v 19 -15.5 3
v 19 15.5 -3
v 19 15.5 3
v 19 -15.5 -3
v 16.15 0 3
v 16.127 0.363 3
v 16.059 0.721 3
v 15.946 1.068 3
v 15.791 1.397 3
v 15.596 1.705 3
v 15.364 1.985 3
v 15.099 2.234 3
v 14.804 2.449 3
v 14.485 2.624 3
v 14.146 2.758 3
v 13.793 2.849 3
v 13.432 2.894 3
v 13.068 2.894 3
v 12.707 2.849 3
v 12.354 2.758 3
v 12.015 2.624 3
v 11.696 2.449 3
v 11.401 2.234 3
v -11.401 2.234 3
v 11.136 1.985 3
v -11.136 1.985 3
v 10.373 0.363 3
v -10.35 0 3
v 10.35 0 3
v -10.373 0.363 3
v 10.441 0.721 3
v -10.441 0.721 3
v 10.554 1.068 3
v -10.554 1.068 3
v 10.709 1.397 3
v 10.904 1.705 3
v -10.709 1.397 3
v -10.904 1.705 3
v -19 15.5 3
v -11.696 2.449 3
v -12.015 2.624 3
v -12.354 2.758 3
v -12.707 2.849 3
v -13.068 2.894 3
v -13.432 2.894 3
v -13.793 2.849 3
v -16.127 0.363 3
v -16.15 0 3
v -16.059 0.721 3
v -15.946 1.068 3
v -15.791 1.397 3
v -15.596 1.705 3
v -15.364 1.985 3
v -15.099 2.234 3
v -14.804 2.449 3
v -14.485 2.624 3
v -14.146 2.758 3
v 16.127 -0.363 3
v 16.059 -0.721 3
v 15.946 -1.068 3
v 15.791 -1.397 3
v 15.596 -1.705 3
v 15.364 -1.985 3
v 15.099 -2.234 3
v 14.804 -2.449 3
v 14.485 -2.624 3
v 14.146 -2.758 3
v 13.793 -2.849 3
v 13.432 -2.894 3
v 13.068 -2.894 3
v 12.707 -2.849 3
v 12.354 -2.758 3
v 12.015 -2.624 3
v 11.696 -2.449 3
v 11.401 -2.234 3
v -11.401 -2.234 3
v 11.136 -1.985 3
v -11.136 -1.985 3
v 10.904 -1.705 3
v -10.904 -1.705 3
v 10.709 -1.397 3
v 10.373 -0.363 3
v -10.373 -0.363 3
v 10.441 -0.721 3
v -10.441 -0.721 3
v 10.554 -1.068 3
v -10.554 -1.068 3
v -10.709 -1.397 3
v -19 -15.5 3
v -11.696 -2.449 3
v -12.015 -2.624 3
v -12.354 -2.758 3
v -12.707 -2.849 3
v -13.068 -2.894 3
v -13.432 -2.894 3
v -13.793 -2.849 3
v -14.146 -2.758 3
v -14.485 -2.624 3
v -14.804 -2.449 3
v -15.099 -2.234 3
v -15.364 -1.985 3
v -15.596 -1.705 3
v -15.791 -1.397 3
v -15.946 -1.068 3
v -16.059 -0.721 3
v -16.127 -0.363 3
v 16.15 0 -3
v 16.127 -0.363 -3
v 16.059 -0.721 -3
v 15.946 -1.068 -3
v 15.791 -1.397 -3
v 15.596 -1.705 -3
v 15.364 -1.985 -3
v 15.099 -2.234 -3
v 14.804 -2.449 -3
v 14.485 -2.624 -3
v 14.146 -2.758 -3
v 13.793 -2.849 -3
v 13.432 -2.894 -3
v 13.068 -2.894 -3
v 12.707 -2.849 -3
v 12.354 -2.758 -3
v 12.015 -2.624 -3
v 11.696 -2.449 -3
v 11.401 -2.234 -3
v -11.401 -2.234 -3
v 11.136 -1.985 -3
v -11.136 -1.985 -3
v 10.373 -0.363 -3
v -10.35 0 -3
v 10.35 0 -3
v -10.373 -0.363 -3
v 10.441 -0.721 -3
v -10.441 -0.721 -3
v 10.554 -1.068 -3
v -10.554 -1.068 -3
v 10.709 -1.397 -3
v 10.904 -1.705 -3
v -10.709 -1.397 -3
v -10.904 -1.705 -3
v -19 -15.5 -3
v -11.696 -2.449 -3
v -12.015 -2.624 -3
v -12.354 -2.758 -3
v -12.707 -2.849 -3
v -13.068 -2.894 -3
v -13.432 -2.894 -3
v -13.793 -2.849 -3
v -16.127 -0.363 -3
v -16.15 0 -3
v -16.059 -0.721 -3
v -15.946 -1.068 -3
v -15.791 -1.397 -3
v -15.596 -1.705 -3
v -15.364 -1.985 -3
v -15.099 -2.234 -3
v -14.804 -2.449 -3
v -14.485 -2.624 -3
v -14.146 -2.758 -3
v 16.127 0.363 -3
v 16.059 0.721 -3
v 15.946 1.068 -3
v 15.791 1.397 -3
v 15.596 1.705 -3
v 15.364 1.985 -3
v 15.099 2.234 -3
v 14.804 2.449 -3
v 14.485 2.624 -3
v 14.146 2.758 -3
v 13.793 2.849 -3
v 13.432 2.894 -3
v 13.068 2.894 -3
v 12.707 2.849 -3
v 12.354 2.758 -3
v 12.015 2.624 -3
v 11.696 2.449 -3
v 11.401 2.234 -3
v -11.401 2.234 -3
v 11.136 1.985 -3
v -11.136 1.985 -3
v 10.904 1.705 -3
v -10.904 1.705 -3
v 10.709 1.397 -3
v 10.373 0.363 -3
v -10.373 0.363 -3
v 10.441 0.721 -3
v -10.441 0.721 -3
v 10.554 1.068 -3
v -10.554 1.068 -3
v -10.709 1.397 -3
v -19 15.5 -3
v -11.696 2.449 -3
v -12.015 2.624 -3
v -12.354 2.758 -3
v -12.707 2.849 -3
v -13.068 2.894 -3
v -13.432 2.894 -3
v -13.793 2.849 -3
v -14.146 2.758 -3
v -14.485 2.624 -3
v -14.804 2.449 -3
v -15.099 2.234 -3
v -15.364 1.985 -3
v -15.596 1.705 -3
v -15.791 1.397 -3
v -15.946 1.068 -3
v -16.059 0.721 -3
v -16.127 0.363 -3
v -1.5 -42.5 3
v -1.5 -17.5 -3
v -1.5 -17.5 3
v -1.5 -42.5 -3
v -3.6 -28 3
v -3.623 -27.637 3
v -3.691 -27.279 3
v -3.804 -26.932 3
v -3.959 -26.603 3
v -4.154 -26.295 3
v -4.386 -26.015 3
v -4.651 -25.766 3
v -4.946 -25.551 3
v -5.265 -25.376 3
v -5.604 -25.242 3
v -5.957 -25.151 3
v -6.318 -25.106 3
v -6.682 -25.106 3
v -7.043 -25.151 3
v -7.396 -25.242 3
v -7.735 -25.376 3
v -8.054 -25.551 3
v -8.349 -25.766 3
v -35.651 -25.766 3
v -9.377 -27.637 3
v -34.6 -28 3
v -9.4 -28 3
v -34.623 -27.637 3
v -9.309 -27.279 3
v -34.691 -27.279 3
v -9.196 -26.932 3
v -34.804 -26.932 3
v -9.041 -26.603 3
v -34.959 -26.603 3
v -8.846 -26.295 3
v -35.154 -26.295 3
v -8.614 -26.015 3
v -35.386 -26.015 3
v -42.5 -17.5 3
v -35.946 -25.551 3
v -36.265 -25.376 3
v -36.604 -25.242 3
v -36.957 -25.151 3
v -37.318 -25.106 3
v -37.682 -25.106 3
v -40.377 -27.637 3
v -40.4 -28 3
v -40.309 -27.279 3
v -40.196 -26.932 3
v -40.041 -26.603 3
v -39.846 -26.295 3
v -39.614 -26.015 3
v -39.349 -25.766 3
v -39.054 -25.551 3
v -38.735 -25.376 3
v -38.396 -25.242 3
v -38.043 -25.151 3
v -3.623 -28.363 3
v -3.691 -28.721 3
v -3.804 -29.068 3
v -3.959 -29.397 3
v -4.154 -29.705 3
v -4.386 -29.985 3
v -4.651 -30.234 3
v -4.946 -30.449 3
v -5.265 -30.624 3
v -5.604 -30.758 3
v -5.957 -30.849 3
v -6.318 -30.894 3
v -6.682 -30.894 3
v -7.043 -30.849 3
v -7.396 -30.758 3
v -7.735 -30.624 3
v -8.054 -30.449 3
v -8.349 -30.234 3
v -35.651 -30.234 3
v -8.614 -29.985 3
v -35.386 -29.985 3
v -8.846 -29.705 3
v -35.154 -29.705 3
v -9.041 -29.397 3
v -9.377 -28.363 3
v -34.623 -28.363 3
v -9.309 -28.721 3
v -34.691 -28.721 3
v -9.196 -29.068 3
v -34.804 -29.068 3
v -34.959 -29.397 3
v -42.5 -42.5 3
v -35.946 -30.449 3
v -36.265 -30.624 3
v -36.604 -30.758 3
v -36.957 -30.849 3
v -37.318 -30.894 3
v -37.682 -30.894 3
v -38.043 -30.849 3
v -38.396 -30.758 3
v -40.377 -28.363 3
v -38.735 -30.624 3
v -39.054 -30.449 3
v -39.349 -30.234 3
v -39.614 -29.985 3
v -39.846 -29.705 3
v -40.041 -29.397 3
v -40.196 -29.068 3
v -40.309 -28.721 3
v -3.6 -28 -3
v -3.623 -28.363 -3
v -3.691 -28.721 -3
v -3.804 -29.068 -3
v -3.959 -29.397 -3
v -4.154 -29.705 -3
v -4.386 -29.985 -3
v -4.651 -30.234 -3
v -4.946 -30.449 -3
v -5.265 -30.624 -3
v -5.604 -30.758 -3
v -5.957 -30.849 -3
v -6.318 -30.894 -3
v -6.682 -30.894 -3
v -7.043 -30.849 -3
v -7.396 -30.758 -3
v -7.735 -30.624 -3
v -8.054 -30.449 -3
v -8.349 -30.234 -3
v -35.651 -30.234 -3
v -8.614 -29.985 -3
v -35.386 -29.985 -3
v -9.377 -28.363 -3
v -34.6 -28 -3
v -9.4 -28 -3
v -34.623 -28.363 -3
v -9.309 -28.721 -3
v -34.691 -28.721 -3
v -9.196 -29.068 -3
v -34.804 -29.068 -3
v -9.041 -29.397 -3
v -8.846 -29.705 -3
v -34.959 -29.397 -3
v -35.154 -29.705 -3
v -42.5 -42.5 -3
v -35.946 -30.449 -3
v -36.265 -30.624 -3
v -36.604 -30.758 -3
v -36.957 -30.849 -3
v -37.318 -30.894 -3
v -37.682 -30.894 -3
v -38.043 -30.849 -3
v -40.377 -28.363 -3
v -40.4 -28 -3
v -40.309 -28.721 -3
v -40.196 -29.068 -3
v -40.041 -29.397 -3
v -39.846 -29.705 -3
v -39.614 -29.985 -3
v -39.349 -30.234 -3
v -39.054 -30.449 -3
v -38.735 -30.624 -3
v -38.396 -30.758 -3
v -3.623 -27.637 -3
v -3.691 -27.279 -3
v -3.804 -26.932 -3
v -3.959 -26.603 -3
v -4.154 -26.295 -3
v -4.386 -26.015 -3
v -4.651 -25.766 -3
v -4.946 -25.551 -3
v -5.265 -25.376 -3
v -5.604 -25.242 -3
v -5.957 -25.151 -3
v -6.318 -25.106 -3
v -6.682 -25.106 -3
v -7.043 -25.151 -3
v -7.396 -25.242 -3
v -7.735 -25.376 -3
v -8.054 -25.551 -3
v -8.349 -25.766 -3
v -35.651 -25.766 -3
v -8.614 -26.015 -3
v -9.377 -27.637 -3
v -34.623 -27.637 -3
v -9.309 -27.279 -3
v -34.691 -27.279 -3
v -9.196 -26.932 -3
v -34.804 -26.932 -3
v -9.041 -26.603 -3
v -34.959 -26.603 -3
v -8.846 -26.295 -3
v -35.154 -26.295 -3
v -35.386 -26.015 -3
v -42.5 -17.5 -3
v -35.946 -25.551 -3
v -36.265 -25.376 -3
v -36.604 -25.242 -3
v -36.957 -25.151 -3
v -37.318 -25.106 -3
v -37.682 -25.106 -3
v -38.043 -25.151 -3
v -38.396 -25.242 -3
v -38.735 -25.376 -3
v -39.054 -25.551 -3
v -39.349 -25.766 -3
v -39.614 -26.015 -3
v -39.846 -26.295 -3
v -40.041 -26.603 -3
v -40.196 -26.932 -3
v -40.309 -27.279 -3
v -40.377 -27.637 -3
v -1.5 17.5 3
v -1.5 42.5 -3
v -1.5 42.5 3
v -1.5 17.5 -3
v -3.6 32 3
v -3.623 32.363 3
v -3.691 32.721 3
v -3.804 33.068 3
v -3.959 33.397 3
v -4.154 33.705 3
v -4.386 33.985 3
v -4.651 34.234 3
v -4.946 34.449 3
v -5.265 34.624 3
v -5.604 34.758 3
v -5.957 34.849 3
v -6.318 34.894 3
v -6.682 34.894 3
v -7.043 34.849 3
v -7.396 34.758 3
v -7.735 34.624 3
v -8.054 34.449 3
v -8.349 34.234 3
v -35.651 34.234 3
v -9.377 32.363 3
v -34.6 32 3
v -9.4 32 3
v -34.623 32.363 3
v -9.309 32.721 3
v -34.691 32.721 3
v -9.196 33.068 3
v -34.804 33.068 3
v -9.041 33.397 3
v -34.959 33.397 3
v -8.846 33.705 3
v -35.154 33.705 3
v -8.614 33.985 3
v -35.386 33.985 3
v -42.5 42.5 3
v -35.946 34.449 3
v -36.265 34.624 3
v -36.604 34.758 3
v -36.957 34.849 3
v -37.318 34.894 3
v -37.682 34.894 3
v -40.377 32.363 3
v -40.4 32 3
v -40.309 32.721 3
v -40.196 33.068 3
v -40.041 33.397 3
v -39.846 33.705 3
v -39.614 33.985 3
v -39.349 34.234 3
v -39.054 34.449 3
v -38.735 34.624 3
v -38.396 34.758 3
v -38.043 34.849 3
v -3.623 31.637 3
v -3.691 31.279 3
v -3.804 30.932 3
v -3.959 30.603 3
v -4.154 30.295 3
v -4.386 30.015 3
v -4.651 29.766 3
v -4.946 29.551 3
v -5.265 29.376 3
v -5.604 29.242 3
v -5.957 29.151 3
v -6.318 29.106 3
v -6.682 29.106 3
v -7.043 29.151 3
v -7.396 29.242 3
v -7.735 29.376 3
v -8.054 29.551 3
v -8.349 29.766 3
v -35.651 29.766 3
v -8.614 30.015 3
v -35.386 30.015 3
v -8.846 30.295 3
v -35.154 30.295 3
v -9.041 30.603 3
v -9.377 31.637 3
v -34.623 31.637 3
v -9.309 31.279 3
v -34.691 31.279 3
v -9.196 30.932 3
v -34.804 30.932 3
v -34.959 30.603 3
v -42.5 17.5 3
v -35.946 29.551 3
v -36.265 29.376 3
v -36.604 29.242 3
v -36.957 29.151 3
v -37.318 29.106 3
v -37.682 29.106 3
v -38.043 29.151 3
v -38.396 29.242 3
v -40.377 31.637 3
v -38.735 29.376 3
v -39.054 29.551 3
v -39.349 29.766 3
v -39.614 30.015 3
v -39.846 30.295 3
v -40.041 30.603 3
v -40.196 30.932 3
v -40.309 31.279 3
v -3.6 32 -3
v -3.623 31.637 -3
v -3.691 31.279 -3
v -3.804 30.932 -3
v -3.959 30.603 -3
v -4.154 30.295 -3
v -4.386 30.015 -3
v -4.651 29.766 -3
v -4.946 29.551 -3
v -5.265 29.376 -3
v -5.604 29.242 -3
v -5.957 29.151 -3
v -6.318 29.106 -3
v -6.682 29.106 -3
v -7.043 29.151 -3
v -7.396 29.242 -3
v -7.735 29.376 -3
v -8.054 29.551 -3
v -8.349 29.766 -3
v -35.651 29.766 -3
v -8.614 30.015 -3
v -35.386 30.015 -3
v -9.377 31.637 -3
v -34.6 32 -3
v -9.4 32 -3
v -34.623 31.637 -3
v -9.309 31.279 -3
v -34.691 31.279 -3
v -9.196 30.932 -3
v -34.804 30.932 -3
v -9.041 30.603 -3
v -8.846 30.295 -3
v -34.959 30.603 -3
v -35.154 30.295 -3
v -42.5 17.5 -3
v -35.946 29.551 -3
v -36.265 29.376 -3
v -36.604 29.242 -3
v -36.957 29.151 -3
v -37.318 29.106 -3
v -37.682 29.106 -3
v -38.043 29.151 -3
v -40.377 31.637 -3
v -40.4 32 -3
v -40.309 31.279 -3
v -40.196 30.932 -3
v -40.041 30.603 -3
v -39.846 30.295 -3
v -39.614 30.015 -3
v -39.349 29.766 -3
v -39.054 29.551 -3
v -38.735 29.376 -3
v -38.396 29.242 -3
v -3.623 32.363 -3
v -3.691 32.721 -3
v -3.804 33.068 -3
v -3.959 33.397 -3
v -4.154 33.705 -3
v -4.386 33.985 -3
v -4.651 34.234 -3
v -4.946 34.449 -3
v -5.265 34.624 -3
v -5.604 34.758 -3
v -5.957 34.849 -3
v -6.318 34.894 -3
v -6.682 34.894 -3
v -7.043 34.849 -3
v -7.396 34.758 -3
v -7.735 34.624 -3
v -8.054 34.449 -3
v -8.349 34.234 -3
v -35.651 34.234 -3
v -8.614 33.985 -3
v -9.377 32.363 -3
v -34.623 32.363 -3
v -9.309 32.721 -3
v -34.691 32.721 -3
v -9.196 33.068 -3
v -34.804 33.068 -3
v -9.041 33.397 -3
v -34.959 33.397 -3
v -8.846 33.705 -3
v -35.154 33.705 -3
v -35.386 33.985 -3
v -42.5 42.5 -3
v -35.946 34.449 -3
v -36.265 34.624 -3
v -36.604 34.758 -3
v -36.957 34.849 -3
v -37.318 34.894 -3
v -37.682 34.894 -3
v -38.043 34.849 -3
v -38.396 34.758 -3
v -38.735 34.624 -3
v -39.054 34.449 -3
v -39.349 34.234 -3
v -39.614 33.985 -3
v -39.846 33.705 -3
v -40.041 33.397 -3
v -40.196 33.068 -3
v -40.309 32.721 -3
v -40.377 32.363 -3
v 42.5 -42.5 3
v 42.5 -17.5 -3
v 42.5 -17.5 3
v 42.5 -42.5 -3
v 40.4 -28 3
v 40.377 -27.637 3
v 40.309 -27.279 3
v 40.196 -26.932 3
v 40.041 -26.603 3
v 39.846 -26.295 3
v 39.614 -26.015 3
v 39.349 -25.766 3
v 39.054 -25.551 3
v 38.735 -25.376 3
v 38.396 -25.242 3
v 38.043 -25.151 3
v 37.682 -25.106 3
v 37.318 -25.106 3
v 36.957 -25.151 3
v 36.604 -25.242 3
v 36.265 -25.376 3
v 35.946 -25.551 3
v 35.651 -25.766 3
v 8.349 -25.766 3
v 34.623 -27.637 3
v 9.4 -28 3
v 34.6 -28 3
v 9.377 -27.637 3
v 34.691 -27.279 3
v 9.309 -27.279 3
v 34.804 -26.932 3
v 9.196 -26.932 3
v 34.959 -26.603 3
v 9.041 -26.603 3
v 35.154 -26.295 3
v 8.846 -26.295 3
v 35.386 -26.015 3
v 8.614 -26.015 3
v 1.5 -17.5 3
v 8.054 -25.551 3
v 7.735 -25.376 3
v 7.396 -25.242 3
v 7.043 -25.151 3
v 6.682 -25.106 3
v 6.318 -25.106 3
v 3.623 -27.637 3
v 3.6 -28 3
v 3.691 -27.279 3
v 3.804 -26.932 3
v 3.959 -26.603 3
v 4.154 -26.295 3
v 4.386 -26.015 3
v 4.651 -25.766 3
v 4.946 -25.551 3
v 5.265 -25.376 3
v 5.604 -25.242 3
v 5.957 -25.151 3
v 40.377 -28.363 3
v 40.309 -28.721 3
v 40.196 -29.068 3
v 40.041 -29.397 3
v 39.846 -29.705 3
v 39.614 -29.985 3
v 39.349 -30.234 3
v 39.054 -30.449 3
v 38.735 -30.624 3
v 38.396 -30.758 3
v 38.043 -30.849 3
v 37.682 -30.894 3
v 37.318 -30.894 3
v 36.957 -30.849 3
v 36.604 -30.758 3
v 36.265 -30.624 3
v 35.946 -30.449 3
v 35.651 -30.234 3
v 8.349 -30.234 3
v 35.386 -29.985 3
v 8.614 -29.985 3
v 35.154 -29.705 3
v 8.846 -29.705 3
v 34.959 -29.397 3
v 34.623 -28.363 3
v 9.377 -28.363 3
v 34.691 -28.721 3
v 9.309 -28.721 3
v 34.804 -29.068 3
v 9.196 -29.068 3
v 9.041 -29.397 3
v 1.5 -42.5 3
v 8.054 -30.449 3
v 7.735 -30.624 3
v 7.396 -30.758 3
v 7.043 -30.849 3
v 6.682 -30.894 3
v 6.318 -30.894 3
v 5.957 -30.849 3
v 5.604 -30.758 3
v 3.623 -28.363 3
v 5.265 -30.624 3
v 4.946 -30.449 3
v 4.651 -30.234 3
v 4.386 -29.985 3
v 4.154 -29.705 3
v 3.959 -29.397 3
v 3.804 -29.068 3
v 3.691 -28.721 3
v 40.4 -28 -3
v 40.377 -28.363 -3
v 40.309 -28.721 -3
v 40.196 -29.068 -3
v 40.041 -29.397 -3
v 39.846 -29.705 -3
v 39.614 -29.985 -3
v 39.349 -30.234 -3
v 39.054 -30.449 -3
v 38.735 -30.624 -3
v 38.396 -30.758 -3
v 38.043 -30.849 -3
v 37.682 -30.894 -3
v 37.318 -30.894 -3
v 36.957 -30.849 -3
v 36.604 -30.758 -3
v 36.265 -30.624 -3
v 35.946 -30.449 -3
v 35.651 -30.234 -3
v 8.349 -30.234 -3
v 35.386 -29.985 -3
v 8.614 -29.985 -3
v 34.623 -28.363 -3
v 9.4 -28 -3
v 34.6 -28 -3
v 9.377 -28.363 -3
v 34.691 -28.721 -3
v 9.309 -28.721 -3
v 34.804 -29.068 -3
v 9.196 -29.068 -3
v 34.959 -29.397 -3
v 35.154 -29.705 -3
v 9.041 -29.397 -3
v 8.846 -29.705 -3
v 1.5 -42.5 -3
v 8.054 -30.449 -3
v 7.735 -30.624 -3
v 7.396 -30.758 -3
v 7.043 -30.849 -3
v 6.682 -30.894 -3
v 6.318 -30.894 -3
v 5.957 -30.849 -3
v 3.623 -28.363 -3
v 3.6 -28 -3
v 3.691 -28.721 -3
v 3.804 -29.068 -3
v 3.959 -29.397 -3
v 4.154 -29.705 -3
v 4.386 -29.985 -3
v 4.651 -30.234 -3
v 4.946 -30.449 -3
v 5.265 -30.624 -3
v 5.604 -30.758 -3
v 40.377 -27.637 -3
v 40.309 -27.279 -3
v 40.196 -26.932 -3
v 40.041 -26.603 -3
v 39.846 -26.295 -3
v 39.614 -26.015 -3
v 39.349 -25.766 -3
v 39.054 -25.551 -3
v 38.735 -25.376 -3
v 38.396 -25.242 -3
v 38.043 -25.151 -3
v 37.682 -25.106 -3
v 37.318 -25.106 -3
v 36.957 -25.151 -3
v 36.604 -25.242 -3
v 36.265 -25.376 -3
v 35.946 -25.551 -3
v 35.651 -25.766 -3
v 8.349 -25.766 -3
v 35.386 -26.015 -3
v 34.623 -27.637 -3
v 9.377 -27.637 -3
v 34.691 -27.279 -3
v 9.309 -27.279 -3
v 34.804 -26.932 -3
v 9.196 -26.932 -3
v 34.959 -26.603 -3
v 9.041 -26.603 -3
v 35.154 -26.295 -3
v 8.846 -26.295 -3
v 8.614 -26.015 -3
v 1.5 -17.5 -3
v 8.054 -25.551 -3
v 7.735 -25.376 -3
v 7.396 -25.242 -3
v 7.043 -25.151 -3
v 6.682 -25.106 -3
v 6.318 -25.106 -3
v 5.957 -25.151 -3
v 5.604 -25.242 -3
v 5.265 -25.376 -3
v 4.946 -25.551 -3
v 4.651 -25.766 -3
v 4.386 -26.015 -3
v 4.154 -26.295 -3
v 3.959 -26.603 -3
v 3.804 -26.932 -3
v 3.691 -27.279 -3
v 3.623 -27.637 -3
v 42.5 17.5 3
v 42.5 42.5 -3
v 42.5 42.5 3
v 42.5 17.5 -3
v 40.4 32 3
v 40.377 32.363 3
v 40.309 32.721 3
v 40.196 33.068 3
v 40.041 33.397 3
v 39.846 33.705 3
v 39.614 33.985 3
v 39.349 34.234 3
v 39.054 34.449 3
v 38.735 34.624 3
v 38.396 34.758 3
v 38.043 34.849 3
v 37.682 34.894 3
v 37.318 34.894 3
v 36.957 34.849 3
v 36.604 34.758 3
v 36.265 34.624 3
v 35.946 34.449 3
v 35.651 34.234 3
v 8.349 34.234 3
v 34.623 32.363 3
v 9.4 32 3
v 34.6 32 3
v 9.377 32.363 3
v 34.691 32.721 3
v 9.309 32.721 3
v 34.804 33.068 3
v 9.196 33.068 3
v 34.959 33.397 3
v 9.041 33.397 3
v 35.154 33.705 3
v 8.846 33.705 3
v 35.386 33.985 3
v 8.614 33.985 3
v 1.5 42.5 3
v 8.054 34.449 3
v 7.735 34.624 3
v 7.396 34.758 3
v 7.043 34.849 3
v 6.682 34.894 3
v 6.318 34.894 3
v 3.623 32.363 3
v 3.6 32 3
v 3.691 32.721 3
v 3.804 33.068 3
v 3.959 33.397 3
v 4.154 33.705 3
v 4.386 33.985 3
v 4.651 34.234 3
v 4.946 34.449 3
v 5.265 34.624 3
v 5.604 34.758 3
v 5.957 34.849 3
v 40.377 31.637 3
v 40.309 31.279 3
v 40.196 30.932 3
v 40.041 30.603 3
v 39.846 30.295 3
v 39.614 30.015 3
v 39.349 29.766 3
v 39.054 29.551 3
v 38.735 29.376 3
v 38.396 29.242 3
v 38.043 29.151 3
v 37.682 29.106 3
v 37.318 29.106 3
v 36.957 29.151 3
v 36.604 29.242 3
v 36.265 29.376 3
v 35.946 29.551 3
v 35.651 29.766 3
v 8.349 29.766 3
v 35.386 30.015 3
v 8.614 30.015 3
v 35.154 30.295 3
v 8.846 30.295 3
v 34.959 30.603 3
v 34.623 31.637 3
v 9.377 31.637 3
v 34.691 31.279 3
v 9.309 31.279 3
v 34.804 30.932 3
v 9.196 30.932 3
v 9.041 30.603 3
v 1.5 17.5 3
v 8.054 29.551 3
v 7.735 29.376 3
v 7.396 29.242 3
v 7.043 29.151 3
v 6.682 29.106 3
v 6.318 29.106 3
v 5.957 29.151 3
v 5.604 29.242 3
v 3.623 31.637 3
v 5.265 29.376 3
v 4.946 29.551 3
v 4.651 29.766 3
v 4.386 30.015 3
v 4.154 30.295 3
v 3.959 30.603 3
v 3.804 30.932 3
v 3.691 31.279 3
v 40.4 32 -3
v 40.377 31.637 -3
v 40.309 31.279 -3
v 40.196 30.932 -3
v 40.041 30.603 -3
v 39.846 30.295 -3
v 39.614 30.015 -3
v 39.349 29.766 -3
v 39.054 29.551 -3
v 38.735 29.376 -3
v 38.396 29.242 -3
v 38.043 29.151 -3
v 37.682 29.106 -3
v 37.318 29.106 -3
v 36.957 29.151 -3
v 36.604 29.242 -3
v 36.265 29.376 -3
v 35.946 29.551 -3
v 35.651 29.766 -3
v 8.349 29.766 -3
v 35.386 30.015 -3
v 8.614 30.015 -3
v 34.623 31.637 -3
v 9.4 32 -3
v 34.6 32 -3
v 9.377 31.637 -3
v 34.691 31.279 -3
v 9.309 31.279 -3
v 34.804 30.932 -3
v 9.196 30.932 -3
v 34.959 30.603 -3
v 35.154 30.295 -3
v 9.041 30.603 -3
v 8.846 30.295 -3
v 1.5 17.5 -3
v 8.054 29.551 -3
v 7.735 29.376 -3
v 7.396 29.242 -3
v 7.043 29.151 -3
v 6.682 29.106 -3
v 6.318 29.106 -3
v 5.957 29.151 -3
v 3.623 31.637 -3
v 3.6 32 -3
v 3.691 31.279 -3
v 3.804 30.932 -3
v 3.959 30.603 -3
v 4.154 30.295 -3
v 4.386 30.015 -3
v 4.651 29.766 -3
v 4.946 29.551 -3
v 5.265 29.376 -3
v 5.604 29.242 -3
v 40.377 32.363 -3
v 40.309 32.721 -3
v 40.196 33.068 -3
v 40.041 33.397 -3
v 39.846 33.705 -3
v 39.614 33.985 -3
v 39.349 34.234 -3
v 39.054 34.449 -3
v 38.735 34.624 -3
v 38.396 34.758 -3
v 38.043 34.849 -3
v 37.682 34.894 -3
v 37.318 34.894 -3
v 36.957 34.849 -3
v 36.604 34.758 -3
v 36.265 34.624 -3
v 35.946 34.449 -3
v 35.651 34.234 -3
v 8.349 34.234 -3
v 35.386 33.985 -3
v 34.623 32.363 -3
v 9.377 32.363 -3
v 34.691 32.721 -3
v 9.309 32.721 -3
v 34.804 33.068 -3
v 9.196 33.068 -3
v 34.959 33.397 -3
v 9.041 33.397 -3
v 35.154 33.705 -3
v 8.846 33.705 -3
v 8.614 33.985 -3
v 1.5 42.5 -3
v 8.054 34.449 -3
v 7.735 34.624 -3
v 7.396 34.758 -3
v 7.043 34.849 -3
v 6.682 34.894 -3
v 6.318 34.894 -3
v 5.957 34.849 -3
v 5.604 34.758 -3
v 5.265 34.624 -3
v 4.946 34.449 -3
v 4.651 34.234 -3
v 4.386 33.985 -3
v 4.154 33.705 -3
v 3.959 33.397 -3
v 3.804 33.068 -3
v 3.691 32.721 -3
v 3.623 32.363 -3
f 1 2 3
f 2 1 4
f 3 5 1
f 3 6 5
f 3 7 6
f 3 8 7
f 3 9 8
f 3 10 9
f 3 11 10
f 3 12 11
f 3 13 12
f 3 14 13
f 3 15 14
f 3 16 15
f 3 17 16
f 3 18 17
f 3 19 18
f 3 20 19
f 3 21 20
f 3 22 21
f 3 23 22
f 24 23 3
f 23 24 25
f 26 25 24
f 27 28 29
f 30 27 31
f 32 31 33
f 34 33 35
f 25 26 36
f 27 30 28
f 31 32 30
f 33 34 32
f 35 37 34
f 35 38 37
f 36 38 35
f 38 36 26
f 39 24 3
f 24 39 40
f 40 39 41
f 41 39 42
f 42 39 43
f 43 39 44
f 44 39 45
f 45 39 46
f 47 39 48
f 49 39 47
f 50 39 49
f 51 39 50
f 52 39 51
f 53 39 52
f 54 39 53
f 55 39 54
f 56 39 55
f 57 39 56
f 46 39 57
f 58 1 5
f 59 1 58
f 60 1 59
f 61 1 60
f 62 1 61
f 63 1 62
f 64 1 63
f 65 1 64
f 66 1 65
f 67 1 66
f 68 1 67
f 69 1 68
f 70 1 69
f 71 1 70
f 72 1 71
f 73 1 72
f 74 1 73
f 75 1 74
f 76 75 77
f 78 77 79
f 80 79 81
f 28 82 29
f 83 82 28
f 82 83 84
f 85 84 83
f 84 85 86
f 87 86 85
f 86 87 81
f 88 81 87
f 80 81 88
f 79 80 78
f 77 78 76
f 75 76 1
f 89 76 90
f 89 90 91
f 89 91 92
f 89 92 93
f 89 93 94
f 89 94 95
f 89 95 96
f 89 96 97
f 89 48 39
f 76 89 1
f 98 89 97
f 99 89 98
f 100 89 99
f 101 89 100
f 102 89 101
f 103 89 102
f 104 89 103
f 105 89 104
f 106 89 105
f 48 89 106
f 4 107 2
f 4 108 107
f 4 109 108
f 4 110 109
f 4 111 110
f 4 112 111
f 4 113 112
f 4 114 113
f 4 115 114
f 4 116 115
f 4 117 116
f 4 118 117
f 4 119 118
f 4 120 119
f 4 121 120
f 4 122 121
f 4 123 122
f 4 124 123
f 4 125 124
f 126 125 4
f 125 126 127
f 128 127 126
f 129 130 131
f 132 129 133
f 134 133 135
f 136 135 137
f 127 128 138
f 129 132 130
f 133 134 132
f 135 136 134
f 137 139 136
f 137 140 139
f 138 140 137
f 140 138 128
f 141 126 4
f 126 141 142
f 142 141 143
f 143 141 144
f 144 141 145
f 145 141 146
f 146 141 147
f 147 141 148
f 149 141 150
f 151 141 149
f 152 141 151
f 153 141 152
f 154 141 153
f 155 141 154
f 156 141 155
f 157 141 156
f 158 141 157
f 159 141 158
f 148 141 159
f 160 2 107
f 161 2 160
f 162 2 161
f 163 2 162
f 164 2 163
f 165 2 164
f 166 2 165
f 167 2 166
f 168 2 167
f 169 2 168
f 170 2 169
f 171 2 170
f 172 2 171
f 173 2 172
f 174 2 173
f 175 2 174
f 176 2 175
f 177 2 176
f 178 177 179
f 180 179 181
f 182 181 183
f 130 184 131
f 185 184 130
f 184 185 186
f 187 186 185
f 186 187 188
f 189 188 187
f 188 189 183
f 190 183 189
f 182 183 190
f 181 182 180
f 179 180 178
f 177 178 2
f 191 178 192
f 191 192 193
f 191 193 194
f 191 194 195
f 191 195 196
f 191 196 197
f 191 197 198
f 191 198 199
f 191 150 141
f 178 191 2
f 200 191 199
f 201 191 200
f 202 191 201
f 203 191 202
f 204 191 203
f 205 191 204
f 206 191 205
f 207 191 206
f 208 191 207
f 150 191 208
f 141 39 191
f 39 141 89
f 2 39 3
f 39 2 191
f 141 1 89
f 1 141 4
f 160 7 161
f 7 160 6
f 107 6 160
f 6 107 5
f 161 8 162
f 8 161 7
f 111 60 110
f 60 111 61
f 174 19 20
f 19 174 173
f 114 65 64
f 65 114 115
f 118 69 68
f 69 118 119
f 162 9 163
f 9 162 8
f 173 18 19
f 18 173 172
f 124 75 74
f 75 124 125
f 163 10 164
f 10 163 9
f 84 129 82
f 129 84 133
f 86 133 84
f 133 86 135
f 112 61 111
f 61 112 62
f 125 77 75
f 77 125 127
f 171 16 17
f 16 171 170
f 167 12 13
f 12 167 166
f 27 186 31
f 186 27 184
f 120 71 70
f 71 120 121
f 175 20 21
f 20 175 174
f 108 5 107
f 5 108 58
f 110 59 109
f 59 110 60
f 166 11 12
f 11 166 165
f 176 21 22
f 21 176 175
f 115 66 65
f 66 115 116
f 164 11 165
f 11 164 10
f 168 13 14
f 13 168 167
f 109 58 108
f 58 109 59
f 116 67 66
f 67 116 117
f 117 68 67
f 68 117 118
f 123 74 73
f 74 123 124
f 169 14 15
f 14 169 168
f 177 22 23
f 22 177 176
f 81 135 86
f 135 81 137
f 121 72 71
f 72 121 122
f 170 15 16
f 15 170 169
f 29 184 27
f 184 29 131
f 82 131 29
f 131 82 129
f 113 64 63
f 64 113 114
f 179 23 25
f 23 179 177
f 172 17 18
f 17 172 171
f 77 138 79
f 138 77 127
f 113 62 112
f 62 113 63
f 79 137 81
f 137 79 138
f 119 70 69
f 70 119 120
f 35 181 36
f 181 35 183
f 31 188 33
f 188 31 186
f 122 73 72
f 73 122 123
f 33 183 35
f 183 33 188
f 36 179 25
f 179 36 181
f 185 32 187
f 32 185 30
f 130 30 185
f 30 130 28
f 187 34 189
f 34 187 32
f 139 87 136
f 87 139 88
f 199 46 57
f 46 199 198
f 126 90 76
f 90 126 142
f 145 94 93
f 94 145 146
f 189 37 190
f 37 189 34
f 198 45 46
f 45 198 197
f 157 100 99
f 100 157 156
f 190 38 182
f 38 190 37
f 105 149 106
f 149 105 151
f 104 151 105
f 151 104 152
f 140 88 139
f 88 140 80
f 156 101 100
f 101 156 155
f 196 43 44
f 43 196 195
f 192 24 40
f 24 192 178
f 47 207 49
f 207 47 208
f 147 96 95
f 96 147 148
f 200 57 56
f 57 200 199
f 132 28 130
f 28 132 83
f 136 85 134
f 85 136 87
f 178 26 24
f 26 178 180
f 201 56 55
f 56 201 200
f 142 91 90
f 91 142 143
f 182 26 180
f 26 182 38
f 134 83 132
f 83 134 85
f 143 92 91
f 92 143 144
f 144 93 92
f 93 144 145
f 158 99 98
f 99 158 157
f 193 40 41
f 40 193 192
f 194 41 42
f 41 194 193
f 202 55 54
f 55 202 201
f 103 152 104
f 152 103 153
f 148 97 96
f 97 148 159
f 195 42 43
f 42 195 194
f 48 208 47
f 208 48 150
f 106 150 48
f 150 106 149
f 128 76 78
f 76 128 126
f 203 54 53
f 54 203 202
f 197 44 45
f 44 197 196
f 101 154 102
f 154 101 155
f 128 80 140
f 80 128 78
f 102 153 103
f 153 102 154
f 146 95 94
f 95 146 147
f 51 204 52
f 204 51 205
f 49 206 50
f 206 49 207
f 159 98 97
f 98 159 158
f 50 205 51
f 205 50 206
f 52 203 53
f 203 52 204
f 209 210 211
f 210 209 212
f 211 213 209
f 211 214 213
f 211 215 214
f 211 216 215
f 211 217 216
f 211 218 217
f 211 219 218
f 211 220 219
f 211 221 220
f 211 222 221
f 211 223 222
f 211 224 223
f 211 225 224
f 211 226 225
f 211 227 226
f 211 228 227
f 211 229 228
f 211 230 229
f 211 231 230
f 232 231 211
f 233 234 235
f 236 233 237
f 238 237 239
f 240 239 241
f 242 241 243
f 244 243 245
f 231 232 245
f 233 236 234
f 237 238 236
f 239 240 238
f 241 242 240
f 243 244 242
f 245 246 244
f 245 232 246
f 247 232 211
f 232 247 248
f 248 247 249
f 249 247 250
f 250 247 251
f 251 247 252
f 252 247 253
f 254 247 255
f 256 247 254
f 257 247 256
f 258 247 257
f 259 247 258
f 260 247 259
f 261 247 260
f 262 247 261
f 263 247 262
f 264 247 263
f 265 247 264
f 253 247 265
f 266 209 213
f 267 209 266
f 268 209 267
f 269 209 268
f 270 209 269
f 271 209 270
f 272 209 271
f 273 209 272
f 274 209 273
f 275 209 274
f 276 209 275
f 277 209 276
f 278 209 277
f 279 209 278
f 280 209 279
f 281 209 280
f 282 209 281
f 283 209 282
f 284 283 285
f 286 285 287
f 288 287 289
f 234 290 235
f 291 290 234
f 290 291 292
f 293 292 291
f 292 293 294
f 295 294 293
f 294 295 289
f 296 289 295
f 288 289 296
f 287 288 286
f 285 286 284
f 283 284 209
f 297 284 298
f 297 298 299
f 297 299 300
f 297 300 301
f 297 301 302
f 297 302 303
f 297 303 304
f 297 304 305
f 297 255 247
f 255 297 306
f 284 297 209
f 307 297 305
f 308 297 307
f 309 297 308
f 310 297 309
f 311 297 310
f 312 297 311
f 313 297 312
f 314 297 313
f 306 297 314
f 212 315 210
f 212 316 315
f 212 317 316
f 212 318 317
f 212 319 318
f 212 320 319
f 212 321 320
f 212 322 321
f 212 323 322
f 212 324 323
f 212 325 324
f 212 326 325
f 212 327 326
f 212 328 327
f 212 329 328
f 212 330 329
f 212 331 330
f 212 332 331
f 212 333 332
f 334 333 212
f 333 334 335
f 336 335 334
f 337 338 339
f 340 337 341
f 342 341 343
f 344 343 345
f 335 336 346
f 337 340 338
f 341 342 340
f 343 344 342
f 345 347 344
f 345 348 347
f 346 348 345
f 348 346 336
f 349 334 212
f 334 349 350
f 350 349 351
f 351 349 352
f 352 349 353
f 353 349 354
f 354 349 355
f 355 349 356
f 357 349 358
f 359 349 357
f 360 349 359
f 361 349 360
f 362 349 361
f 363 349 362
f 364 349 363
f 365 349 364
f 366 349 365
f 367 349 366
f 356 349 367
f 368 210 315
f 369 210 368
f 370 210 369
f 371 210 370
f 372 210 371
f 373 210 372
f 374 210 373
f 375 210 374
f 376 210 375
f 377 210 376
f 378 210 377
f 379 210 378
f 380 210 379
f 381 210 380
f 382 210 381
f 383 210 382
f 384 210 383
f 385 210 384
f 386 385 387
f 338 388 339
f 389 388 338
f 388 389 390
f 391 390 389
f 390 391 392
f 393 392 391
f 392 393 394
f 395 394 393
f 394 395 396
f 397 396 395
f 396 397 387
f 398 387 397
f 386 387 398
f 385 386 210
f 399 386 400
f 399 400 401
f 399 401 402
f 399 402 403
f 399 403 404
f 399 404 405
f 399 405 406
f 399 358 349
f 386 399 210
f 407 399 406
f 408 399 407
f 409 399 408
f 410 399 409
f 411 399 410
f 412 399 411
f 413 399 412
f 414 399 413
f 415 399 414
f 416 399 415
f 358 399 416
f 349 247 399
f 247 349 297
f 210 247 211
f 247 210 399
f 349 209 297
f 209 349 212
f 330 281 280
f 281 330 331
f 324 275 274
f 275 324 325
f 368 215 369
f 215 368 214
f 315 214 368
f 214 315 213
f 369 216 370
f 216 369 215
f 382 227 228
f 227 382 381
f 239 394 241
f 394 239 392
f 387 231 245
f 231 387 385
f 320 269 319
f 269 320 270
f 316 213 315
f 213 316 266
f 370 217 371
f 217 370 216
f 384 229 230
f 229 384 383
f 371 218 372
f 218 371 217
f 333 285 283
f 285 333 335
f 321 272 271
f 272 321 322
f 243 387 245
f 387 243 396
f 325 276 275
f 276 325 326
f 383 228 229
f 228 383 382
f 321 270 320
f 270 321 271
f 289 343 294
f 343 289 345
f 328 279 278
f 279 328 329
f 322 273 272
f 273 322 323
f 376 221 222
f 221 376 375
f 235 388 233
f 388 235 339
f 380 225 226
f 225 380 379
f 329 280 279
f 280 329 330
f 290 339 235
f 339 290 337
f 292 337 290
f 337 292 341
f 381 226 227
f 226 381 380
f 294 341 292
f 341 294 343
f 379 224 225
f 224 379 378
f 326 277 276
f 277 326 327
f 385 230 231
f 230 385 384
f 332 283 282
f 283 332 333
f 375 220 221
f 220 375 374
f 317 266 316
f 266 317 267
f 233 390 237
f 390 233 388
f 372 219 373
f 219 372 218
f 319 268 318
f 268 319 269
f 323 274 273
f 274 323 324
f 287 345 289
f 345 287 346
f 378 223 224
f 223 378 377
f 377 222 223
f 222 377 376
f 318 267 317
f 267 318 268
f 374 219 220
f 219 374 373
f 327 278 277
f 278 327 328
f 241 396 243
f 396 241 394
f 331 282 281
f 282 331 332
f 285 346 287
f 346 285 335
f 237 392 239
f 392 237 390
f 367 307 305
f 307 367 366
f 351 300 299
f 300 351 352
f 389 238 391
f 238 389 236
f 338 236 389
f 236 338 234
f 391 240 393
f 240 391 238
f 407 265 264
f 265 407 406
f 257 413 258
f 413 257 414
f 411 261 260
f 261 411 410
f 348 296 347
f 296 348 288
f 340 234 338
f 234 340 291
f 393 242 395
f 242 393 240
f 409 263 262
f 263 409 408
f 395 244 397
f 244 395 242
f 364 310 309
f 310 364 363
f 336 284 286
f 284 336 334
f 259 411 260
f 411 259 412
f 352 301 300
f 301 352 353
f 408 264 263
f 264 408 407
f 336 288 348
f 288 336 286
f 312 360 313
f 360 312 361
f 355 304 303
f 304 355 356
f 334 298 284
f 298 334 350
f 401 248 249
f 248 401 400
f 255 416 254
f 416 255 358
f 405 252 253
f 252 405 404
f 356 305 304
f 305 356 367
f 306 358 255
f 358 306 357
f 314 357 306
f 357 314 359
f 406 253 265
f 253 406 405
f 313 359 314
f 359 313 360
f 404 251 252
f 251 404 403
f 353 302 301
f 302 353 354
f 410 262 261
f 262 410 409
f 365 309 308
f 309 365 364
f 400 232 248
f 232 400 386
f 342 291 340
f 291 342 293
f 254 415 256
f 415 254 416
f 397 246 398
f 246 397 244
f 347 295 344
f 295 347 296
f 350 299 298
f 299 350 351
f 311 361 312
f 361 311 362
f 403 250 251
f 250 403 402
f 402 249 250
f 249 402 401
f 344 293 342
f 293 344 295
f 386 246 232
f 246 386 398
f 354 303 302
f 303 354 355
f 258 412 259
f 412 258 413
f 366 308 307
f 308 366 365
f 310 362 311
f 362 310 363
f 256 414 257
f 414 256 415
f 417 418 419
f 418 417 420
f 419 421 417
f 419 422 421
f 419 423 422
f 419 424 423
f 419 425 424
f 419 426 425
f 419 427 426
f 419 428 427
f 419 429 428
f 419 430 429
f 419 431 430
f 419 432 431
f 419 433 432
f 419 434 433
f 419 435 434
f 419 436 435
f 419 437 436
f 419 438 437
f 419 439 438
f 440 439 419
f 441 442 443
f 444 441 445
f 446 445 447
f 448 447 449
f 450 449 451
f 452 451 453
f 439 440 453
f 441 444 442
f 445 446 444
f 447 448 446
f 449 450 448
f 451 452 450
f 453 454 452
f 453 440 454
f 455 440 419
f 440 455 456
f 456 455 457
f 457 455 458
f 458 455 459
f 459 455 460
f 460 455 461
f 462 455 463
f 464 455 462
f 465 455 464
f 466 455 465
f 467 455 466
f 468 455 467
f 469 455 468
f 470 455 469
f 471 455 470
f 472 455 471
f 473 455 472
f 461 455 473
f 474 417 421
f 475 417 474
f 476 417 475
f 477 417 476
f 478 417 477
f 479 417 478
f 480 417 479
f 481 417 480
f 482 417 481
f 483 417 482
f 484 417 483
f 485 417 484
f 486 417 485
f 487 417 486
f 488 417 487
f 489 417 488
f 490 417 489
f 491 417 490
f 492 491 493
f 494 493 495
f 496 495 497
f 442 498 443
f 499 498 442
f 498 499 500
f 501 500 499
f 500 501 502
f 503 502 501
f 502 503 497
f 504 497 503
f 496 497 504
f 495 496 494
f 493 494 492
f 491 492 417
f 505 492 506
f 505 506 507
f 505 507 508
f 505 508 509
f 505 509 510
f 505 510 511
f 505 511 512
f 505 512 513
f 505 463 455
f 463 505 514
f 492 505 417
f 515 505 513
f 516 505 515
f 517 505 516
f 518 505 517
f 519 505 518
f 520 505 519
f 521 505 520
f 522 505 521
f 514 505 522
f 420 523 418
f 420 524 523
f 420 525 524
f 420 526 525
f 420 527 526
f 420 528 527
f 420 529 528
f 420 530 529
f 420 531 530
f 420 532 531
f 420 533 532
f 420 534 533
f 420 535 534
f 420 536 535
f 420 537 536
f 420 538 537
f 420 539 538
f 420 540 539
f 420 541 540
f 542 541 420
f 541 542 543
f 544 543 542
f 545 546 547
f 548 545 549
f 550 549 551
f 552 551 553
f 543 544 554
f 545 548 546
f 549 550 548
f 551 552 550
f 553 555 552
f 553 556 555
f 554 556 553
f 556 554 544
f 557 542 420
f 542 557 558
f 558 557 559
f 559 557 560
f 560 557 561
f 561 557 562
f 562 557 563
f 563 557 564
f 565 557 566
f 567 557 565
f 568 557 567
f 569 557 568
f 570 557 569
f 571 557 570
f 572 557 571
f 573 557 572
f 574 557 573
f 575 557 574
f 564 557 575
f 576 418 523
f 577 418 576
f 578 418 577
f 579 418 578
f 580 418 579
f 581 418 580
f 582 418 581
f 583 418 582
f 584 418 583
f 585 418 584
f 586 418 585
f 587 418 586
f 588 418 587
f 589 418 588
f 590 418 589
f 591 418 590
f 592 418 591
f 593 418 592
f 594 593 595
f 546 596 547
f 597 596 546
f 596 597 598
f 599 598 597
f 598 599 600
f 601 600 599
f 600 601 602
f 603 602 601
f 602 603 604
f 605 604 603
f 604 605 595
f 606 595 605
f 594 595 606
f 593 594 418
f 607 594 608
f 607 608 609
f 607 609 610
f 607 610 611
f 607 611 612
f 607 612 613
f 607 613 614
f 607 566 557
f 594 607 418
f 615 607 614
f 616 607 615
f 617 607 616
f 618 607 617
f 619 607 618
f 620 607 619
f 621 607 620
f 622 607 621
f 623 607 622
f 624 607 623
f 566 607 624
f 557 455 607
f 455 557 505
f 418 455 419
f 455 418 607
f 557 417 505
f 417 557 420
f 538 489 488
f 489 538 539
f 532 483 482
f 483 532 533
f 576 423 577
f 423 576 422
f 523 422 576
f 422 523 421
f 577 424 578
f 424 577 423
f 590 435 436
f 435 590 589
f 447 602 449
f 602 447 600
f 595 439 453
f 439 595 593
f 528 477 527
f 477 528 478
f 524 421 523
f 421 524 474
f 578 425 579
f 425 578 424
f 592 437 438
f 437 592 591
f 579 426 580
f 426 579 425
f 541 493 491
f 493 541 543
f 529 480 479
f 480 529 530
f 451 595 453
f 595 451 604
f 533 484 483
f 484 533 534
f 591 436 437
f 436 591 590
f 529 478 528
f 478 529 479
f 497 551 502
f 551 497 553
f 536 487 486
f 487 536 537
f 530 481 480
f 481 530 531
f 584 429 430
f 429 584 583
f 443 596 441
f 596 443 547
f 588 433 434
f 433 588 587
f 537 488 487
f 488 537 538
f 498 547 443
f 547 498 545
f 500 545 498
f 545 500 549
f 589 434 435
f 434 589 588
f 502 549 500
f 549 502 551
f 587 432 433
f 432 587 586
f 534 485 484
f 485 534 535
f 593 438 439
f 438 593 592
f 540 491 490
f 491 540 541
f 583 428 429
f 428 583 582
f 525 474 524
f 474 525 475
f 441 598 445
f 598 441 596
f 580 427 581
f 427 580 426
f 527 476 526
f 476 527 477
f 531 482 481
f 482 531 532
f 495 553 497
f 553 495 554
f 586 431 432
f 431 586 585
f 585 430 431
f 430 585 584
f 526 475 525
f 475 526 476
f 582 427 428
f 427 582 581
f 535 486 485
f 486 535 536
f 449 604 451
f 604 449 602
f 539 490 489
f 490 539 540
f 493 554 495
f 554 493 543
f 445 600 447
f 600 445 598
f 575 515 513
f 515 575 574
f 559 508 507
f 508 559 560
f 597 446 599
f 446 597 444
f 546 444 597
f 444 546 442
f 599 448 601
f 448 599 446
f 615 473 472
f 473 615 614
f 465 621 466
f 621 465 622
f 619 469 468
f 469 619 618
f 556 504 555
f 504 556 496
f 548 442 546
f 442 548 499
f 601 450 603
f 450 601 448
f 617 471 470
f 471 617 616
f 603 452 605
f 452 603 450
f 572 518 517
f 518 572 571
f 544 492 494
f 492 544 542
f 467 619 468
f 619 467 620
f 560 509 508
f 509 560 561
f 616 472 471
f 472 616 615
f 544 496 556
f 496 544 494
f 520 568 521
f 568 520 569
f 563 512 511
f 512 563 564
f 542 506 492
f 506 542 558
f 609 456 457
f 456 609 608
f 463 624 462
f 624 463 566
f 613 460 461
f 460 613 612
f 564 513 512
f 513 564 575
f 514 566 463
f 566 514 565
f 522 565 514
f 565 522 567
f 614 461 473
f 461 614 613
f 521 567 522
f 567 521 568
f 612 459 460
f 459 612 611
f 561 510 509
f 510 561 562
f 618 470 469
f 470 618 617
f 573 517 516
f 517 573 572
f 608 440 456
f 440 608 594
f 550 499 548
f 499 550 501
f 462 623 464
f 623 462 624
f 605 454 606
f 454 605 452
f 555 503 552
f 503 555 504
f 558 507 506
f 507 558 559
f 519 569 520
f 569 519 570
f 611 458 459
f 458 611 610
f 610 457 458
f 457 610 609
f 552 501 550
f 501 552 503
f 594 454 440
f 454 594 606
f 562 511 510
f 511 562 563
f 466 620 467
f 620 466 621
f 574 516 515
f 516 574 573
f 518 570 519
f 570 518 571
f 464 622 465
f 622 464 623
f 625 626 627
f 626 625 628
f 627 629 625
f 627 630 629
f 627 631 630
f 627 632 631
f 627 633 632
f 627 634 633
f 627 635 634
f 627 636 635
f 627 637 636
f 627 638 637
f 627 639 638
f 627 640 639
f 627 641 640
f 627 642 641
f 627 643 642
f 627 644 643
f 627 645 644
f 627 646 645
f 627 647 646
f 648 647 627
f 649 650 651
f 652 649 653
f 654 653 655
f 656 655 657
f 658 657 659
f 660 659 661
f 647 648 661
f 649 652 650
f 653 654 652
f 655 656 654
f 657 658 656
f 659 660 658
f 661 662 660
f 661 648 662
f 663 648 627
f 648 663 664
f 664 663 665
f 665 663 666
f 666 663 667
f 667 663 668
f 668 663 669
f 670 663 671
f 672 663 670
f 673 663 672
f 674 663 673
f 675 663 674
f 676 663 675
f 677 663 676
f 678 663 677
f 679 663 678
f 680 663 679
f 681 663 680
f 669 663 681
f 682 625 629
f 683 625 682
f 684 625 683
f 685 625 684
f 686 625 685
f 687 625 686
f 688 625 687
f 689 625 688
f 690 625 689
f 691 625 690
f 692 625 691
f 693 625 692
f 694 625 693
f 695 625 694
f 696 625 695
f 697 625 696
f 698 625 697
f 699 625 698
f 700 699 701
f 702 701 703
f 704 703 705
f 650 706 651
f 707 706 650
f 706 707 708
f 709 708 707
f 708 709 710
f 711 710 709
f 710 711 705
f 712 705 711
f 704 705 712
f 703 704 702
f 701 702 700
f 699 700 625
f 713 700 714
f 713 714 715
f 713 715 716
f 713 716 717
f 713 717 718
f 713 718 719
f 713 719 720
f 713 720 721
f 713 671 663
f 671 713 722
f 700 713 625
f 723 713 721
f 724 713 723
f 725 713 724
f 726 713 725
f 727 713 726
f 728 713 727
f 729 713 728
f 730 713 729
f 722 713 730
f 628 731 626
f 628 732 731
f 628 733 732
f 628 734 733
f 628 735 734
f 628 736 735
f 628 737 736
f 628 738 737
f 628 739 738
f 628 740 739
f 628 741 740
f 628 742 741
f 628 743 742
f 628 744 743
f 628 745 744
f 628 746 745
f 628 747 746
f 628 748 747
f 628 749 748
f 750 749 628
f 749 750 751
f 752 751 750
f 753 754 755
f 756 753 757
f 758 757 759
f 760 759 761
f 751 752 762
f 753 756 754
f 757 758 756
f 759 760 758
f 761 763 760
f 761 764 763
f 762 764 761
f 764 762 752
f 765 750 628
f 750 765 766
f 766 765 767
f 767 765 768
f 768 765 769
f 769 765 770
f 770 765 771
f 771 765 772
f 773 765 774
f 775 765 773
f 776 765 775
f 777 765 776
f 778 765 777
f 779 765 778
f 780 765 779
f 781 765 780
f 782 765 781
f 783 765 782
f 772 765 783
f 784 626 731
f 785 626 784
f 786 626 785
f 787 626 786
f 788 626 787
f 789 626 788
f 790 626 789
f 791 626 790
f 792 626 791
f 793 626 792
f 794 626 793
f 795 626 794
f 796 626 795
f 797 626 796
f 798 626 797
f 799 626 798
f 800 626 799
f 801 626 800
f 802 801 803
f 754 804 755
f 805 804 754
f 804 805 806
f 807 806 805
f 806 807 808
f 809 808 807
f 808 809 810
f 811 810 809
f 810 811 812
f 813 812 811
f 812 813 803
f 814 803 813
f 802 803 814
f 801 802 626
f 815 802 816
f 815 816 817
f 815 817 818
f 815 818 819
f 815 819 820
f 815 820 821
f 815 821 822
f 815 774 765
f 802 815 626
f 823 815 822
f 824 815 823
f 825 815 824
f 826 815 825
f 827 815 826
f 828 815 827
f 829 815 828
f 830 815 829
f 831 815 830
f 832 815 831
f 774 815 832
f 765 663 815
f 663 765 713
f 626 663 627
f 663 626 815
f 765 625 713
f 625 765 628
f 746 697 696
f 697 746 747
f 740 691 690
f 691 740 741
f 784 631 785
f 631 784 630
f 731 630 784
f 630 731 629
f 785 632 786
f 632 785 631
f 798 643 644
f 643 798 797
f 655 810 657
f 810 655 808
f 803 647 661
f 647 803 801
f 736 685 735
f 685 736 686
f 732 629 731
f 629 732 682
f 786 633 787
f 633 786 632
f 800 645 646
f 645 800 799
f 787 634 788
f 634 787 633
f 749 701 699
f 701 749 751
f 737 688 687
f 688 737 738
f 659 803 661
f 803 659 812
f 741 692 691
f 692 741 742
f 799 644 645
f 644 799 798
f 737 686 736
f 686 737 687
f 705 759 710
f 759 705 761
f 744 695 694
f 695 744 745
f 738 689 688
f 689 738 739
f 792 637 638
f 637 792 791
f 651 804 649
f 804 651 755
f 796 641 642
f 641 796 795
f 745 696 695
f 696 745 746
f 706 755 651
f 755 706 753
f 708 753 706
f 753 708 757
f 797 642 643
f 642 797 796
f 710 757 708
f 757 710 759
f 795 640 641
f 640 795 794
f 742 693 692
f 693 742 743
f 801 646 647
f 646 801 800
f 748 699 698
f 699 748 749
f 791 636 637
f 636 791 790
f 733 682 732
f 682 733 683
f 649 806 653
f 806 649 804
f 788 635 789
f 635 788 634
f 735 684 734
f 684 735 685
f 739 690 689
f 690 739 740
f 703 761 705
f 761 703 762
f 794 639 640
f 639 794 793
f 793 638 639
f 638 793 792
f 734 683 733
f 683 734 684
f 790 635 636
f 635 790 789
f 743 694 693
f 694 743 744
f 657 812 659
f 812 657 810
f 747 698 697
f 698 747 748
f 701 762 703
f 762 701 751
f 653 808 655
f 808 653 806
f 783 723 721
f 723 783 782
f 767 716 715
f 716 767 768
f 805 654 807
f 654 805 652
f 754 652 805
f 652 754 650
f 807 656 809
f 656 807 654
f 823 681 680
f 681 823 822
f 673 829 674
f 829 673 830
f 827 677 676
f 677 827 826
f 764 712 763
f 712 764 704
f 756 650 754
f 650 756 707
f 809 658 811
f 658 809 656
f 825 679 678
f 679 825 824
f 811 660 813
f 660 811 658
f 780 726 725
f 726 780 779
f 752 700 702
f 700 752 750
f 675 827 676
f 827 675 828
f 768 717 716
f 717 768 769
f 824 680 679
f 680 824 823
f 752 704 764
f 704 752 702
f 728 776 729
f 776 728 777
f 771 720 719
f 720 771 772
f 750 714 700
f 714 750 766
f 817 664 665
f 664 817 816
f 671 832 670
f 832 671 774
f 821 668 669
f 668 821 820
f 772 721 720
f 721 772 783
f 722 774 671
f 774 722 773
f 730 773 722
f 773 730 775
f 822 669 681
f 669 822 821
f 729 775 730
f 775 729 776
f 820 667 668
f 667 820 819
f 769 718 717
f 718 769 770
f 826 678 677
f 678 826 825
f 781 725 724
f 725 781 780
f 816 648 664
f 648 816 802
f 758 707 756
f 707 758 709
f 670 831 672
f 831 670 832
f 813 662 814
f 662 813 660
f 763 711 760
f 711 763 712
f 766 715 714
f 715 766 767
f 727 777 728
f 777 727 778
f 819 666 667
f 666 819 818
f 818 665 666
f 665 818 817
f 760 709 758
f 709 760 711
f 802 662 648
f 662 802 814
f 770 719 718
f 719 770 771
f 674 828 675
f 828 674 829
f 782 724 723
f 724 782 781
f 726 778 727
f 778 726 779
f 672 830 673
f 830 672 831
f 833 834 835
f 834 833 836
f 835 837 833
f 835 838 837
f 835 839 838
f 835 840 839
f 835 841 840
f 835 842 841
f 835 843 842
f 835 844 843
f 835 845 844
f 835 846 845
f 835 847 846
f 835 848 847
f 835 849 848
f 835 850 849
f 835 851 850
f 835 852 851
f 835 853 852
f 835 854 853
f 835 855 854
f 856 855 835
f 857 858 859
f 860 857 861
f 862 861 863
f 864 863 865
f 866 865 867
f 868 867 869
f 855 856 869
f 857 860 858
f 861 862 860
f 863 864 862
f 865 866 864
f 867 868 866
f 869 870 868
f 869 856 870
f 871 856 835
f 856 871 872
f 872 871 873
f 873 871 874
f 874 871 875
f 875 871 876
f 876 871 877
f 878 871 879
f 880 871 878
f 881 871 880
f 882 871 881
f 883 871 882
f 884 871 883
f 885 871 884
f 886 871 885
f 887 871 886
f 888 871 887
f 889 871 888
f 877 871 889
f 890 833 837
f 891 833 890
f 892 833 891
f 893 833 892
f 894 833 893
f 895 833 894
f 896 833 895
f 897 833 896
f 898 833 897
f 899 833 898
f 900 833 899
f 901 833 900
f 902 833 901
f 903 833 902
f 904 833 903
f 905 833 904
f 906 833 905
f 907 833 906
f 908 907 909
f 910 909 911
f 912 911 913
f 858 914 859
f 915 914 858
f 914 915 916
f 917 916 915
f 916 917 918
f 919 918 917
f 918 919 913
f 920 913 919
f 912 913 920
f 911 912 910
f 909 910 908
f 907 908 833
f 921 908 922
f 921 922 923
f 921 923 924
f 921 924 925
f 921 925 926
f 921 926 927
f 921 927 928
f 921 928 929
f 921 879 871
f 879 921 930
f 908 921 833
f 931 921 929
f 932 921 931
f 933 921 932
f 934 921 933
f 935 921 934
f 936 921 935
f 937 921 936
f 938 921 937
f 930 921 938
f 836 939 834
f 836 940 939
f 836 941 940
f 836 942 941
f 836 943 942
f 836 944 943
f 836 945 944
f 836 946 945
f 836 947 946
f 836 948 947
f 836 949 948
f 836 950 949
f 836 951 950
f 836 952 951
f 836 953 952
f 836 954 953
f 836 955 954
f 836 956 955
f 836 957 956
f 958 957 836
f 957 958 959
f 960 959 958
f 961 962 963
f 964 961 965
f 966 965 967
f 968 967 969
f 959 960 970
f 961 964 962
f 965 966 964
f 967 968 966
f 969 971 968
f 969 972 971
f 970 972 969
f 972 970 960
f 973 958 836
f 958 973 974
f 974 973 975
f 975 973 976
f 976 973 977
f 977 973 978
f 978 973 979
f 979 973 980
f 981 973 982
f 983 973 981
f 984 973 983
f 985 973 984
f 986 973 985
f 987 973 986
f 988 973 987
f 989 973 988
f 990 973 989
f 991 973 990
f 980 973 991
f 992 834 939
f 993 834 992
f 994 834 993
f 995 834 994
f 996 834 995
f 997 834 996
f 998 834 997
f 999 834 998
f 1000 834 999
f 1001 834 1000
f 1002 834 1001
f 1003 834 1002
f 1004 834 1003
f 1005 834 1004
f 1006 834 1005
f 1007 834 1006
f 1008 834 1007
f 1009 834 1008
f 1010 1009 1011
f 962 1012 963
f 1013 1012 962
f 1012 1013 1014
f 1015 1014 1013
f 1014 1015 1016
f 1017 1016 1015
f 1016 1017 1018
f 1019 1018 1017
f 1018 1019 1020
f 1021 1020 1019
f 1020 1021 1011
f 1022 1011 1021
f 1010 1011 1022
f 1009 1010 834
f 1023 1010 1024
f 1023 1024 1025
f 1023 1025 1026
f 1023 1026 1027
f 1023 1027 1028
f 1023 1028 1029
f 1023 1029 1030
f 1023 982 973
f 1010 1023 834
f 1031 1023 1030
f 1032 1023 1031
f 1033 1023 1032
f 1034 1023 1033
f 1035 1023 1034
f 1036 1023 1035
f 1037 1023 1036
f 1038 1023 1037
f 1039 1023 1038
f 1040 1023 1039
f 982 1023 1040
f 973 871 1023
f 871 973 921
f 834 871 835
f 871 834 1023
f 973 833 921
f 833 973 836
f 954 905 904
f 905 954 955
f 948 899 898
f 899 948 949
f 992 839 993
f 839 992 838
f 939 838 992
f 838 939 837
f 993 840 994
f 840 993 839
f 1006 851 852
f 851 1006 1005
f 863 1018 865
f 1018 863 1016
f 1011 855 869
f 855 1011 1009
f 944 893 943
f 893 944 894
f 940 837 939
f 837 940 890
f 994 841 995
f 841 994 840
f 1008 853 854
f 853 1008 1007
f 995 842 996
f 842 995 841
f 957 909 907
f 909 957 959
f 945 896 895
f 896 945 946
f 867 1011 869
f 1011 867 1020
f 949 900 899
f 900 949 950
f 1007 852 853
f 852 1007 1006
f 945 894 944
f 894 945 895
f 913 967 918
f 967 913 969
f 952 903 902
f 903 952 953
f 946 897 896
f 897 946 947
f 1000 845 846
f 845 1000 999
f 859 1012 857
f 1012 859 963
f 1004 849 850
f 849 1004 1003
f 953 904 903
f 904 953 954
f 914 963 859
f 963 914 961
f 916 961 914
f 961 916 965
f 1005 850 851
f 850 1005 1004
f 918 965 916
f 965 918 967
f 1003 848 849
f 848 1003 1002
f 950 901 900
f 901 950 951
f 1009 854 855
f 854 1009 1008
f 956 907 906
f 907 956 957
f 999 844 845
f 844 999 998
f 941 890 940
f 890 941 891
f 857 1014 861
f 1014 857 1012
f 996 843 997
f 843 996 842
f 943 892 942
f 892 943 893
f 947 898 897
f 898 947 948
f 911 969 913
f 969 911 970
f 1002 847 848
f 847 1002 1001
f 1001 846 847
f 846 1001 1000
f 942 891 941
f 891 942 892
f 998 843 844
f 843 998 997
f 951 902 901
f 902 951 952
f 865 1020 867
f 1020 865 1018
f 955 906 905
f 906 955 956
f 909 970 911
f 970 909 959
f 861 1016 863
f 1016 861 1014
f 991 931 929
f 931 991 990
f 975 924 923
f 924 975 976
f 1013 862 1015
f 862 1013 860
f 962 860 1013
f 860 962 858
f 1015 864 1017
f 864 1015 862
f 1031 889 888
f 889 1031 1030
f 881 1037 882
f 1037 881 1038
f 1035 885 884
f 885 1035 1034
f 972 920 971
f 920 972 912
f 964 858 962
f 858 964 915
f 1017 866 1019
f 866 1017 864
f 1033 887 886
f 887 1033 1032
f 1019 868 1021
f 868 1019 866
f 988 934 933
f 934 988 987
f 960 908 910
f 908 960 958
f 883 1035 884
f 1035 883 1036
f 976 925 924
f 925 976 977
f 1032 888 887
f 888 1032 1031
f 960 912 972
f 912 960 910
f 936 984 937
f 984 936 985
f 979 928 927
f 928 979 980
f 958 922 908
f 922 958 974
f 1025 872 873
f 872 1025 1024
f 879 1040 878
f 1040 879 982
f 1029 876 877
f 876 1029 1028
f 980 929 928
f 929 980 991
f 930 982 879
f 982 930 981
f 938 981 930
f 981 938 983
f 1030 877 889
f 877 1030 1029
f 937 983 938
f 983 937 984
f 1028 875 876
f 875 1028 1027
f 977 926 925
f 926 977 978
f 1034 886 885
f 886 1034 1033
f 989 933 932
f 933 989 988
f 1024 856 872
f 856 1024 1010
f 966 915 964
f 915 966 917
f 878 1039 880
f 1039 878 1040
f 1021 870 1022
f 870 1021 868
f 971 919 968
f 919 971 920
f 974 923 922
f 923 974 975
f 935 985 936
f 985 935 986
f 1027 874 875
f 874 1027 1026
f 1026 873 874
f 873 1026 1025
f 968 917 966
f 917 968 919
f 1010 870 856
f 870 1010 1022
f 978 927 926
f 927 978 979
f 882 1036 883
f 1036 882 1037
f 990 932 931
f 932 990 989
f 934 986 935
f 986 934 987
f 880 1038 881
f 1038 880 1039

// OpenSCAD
$fn=50;

translate([0,0,0]) makeleadscrewriser();
translate([-22,-30,0]) makesupportrodriser();
translate([-22,30,0]) makesupportrodriser();
translate([22,-30,0]) makesupportrodriser();
translate([22,30,0]) makesupportrodriser();

module makeleadscrewriser()
{
  difference()
  {
    translate([0,0,0]) cube([38,31,6],center=true);
    translate([26.5/2,0,0]) cylinder(h=10,r1=5.8/2,r2=5.8/2,center=true);
    translate([-26.5/2,0,0]) cylinder(h=10,r1=5.8/2,r2=5.8/2,center=true);
  }
}

module makesupportrodriser()
{
  difference()
  {
    translate([0,0,0]) cube([41,25,6],center=true);
    translate([31/2,2,0]) cylinder(h=10,r1=5.8/2,r2=5.8/2,center=true);
    translate([-31/2,2,0]) cylinder(h=10,r1=5.8/2,r2=5.8/2,center=true);
  }
}
